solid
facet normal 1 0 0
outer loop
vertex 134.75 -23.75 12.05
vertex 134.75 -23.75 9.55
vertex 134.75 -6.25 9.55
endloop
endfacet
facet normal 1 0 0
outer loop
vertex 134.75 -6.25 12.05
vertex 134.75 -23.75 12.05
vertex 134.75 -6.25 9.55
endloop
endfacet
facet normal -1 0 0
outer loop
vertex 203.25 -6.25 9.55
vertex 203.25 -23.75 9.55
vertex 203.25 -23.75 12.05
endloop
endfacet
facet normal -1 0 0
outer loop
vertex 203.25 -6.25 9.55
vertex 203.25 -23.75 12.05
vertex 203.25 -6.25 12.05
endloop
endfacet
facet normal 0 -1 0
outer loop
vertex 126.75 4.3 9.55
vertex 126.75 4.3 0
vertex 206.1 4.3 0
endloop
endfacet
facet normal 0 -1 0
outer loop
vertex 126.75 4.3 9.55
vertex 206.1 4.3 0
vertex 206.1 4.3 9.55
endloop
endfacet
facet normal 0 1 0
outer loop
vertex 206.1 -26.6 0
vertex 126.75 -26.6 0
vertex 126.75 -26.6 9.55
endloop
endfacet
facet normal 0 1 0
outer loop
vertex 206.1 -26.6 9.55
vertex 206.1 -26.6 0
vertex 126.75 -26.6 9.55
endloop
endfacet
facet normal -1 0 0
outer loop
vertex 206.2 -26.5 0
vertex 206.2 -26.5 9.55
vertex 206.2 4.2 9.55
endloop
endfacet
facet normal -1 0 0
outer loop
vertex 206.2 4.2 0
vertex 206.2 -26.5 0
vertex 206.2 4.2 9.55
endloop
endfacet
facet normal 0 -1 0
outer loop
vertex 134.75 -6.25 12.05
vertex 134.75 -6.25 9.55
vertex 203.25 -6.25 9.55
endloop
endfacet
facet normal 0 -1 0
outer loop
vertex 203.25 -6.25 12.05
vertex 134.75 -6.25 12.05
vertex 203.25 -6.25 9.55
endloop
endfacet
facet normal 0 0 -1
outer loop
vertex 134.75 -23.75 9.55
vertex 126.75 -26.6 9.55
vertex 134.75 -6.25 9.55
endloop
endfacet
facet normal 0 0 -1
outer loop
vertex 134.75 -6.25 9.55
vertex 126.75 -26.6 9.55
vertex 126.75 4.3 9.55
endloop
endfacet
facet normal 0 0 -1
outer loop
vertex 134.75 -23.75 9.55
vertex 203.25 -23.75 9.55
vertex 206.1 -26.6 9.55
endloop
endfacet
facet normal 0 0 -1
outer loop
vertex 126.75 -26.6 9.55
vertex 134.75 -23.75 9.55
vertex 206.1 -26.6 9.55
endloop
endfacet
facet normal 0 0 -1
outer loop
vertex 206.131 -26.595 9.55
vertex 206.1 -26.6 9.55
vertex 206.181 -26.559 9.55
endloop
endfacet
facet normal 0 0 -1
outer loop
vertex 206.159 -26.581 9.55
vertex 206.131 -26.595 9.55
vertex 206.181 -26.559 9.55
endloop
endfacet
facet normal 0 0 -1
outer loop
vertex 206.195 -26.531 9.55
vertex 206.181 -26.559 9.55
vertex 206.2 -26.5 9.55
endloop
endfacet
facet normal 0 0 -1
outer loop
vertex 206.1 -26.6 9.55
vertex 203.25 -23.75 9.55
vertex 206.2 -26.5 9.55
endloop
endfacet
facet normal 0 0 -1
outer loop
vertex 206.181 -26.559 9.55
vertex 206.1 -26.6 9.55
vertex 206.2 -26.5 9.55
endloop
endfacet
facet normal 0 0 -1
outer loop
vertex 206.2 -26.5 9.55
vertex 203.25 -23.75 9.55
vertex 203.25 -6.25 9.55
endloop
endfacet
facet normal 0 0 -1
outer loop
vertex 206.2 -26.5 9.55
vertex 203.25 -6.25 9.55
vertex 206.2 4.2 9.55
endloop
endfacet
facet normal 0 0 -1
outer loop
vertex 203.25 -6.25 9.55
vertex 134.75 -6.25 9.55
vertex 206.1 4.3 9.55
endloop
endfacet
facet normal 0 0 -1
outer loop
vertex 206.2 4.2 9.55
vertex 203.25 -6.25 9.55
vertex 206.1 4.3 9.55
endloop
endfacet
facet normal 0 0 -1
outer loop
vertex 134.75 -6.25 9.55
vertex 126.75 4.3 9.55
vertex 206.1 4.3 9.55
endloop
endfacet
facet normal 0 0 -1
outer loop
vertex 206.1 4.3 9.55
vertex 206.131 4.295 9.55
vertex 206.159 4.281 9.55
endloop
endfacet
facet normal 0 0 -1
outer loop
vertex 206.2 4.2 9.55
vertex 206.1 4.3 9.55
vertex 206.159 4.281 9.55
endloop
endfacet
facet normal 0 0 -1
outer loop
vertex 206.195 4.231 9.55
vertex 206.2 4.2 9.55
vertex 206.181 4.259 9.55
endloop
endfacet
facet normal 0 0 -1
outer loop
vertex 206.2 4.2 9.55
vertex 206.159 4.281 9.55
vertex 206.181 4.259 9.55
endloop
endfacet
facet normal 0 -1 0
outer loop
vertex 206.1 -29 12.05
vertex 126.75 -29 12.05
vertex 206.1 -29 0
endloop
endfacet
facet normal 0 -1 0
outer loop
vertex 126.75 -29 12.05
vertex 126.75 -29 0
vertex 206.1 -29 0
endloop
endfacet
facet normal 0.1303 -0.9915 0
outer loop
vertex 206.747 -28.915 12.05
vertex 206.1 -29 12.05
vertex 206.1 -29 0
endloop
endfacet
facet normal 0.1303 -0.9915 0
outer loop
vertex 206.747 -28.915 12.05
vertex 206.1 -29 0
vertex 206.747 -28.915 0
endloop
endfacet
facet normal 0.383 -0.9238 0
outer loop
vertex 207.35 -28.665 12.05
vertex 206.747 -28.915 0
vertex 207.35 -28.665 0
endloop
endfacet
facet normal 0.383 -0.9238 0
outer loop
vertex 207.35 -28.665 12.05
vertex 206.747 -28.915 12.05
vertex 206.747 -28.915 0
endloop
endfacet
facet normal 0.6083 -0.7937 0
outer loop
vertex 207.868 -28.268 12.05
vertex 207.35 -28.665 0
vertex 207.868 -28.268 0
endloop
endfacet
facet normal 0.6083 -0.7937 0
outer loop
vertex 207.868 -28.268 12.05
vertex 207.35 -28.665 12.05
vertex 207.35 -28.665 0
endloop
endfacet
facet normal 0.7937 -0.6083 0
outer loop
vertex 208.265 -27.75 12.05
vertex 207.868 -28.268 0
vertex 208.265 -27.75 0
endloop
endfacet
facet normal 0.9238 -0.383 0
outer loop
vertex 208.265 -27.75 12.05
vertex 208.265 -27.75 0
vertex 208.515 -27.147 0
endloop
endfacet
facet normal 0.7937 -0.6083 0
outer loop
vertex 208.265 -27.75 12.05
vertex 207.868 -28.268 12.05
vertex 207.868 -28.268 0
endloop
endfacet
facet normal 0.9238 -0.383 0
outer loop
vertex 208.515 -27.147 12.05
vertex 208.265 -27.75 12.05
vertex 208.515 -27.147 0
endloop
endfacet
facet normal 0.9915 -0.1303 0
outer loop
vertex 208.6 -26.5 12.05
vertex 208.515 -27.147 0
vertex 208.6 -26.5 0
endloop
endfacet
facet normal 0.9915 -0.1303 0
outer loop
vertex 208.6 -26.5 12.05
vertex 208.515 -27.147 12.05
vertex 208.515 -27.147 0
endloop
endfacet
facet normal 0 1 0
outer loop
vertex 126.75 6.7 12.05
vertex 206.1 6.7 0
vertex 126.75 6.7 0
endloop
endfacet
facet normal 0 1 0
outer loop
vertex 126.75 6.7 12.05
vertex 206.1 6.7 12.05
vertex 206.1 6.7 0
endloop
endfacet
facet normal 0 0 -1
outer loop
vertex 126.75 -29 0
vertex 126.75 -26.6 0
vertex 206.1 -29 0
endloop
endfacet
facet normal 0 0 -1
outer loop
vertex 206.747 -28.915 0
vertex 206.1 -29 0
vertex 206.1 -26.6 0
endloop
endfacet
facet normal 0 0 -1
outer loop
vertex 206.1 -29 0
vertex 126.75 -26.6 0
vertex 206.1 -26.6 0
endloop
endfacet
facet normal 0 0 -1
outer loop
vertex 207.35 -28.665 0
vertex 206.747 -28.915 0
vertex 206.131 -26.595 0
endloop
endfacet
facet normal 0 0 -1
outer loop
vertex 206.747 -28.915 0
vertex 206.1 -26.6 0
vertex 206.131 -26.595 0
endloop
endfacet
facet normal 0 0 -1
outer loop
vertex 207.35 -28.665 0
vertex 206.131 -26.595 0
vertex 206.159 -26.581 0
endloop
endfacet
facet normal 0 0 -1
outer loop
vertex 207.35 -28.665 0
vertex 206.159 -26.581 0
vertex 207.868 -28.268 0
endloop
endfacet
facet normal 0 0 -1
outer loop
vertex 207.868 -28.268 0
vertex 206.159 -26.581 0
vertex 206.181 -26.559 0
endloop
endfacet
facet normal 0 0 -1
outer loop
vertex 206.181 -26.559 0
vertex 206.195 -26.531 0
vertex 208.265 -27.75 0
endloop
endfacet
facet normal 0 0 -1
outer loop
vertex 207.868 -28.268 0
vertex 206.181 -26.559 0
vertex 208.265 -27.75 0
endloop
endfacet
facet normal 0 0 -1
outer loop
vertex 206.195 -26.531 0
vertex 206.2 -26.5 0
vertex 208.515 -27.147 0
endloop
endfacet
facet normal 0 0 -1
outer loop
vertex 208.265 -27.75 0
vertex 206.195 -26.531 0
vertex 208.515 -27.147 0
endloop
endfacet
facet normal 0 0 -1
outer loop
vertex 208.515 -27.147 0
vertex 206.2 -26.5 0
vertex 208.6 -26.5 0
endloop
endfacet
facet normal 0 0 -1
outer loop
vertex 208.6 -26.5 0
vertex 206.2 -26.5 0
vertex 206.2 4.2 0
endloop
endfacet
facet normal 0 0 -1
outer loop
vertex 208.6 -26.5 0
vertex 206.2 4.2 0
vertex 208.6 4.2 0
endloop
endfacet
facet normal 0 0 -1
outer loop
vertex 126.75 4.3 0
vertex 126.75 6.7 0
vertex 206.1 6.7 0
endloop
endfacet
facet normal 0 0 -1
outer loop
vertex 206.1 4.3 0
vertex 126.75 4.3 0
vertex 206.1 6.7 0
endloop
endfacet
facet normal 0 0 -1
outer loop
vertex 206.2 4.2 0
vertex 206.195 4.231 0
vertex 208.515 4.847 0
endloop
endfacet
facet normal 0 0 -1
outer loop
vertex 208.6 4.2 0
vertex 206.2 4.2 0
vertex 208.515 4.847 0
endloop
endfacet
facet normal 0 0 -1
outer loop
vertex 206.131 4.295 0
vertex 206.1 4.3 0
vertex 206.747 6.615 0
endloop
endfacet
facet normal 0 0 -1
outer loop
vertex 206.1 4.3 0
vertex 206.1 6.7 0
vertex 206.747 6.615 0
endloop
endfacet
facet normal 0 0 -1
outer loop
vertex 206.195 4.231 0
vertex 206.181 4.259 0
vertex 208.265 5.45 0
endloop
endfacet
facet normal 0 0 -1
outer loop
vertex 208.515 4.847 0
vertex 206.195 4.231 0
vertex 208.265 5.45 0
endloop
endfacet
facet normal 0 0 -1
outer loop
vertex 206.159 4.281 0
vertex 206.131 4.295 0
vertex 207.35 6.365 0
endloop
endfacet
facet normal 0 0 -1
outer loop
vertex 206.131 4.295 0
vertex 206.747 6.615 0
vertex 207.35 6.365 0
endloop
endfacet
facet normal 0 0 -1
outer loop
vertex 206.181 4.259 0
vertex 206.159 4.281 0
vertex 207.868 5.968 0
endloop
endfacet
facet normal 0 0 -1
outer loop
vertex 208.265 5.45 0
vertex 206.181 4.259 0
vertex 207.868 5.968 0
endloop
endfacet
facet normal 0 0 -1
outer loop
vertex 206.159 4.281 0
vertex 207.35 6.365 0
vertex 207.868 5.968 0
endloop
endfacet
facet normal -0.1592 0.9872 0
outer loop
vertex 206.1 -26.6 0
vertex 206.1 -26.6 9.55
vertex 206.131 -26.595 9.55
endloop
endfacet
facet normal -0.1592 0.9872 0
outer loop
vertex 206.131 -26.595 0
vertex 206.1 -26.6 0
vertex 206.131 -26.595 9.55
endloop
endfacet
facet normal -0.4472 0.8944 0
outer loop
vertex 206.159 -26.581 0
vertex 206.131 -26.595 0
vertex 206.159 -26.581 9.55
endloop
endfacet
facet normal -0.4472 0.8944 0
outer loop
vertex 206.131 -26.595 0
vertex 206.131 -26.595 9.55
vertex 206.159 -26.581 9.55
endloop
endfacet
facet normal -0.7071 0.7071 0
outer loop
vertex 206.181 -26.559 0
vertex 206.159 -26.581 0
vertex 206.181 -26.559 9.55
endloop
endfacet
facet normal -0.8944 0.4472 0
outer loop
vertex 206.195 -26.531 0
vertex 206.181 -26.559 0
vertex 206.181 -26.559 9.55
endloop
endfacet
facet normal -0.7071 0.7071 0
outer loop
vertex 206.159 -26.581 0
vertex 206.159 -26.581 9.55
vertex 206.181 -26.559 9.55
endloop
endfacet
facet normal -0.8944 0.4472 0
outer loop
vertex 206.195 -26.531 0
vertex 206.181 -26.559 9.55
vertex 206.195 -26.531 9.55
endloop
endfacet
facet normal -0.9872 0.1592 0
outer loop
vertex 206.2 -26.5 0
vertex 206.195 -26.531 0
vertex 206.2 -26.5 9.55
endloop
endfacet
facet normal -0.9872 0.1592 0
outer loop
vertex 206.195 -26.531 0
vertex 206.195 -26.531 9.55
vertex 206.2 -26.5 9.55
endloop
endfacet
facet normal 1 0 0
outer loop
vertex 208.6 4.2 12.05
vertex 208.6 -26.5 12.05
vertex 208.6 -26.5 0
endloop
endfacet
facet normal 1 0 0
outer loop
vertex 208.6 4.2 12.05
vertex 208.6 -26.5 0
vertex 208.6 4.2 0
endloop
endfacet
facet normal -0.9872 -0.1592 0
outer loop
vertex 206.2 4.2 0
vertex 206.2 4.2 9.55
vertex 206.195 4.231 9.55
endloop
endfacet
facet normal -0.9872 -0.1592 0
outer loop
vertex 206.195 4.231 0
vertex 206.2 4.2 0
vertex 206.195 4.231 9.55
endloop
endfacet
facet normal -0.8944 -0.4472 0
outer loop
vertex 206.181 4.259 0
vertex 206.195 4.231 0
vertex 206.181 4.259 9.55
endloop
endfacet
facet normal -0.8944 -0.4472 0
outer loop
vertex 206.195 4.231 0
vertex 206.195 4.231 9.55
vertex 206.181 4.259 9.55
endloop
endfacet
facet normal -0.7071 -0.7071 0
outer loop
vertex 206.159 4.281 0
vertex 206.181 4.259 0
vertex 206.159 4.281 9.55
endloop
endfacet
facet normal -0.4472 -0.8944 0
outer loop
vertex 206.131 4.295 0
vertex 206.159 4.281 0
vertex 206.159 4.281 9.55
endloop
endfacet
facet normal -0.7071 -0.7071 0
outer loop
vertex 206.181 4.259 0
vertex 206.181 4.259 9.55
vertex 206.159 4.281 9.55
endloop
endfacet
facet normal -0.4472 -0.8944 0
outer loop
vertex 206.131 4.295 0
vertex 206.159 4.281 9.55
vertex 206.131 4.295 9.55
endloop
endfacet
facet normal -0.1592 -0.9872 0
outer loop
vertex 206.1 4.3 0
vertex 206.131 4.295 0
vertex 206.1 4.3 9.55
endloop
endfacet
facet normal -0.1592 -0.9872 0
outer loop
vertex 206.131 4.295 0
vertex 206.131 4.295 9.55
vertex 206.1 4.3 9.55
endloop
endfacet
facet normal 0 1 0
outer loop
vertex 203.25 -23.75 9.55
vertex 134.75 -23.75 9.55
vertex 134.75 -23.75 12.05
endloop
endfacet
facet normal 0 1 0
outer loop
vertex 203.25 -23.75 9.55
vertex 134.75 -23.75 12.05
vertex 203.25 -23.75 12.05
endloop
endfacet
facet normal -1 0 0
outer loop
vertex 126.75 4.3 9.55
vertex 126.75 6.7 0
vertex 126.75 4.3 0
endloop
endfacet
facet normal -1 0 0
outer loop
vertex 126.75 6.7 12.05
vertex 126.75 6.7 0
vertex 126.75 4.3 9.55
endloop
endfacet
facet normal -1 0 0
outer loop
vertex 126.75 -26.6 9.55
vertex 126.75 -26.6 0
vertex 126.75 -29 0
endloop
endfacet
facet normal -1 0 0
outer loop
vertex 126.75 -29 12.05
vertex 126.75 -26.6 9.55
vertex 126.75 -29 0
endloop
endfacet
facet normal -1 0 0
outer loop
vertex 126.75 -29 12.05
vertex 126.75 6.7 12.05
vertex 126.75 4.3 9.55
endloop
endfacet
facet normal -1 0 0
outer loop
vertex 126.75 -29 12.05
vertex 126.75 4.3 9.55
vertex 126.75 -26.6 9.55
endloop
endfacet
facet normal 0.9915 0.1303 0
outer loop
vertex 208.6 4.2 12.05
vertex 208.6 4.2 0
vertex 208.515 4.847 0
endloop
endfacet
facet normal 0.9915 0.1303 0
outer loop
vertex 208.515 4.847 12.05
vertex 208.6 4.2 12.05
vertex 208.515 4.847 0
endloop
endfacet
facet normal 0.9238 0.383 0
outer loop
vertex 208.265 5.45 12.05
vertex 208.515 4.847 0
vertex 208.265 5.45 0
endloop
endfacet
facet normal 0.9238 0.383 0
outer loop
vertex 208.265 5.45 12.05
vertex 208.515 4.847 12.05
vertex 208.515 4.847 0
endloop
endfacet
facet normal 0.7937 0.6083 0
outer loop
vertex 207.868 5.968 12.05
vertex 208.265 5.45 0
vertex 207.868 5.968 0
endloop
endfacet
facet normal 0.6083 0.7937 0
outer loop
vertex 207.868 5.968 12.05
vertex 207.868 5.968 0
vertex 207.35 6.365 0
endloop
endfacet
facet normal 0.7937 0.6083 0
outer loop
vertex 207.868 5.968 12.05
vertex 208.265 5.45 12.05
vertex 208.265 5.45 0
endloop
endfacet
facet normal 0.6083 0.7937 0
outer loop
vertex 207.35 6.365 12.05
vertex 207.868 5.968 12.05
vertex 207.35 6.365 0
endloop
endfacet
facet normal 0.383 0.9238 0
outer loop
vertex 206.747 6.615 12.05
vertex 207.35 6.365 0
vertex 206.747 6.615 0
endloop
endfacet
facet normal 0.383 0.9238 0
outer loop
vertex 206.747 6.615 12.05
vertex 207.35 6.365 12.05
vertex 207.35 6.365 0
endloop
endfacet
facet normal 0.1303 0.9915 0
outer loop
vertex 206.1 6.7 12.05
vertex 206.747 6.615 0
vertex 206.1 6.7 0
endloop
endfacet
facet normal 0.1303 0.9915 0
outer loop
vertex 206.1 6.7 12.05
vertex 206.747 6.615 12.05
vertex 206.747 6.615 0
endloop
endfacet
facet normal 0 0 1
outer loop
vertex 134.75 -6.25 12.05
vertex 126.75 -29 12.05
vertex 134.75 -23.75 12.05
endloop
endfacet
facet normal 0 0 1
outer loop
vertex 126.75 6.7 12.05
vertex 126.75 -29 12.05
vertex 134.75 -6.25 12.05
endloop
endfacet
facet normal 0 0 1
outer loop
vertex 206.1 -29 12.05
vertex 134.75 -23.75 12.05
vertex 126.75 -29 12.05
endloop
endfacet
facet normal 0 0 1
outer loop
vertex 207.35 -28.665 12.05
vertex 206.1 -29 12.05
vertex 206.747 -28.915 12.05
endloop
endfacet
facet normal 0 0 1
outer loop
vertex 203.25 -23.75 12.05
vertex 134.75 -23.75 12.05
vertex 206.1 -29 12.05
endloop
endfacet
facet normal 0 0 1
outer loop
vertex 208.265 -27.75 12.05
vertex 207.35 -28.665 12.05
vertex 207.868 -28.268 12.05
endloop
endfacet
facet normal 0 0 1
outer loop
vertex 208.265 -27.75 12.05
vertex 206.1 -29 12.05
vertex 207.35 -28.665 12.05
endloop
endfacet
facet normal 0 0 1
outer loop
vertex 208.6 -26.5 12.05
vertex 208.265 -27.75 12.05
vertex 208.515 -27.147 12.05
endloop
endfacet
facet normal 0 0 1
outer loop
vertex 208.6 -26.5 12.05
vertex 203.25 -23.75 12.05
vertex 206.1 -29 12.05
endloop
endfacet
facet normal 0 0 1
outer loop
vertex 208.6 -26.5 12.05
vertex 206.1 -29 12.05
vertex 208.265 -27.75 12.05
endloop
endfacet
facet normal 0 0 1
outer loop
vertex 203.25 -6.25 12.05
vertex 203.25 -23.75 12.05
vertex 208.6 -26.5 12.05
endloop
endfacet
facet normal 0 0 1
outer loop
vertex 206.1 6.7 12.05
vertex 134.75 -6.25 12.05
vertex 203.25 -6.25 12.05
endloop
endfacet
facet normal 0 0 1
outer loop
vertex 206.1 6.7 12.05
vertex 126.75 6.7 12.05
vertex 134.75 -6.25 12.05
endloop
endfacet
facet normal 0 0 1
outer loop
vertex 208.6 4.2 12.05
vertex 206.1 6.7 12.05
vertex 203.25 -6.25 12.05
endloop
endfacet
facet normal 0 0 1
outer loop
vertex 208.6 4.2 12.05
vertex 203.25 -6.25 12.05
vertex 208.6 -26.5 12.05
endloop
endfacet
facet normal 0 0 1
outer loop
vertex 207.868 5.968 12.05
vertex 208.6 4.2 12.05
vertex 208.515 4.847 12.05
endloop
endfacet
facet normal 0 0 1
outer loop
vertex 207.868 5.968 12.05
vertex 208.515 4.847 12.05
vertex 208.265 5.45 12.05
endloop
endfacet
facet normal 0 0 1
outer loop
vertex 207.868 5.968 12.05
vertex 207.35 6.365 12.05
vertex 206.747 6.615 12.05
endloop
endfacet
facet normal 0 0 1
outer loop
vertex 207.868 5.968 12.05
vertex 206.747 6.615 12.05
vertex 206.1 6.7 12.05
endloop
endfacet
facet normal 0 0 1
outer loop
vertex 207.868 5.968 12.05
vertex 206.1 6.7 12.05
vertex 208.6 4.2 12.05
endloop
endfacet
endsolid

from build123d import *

# Parameters (mm, degrees)
PAD038_DEPTH    = 9.55
THICKNESS004_T  = -2.4
SKETCH044_W     = 30.9
SKETCH044_H     = 9.55
POCKET008_DEPTH = 2.4
SKETCH040_W     = 68.5
SKETCH040_H     = 17.5
PAD036_DEPTH    = 2.5


with BuildPart() as body012:
    # Sketch043 → Pad038 (new body)
    with BuildSketch(Plane.XY):
        with BuildLine():
            Line((126.75, 6.7), (126.75, -29))
            Line((126.75, -29), (206.1, -29))
            ThreePointArc((206.1, -29), (207.867767, -28.267767), (208.6, -26.5))
            Line((208.6, -26.5), (208.6, 4.2))
            ThreePointArc((208.6, 4.2), (207.867767, 5.967767), (206.1, 6.7))
            Line((206.1, 6.7), (126.75, 6.7))
        make_face()
    extrude(amount=-PAD038_DEPTH)

    # Thickness004
    thickness004_openings = [body012.faces().sort_by_distance(p)[0] for p in [
        (167.637908, -11.15, -9.55),
        (167.637908, -11.15, 0),
    ]]
    offset(amount=THICKNESS004_T, openings=thickness004_openings, kind=Kind.INTERSECTION)

    # Sketch044 (on Face8 of Thickness004) → Pocket008 (cut)
    with BuildSketch(Plane.YZ.offset(129.15)):
        with Locations((-11.15, -4.775)):
            Rectangle(SKETCH044_W, SKETCH044_H)
    extrude(amount=-POCKET008_DEPTH, mode=Mode.SUBTRACT)


with BuildPart() as body012_1:
    # Body012 placement: moved
    add(body012.part.moved(Location((0, 0, 10))))


with BuildPart() as tail_cover:
    # Sketch040 → Pad036 (new body)
    with BuildSketch(Plane.XY):
        with BuildLine():
            Line((126.75, 6.7), (126.75, -29))
            Line((126.75, -29), (206.1, -29))
            ThreePointArc((206.1, -29), (207.867767, -28.267767), (208.6, -26.5))
            Line((208.6, -26.5), (208.6, 4.2))
            ThreePointArc((208.6, 4.2), (207.867767, 5.967767), (206.1, 6.7))
            Line((206.1, 6.7), (126.75, 6.7))
        make_face()
        with Locations((169, -15)):
            Rectangle(SKETCH040_W, SKETCH040_H, mode=Mode.SUBTRACT)
    extrude(amount=PAD036_DEPTH)


with BuildPart() as tail_cover_1:
    # Body010 placement: moved
    add(tail_cover.part.moved(Location((0, 0, 10))))

    # Fusion: union Body012
    add(body012_1.part)


with BuildPart() as tail_cover_2:
    # Fusion placement: moved
    add(tail_cover_1.part.moved(Location((0, 0, -0.45))))


solid = tail_cover_2.part
